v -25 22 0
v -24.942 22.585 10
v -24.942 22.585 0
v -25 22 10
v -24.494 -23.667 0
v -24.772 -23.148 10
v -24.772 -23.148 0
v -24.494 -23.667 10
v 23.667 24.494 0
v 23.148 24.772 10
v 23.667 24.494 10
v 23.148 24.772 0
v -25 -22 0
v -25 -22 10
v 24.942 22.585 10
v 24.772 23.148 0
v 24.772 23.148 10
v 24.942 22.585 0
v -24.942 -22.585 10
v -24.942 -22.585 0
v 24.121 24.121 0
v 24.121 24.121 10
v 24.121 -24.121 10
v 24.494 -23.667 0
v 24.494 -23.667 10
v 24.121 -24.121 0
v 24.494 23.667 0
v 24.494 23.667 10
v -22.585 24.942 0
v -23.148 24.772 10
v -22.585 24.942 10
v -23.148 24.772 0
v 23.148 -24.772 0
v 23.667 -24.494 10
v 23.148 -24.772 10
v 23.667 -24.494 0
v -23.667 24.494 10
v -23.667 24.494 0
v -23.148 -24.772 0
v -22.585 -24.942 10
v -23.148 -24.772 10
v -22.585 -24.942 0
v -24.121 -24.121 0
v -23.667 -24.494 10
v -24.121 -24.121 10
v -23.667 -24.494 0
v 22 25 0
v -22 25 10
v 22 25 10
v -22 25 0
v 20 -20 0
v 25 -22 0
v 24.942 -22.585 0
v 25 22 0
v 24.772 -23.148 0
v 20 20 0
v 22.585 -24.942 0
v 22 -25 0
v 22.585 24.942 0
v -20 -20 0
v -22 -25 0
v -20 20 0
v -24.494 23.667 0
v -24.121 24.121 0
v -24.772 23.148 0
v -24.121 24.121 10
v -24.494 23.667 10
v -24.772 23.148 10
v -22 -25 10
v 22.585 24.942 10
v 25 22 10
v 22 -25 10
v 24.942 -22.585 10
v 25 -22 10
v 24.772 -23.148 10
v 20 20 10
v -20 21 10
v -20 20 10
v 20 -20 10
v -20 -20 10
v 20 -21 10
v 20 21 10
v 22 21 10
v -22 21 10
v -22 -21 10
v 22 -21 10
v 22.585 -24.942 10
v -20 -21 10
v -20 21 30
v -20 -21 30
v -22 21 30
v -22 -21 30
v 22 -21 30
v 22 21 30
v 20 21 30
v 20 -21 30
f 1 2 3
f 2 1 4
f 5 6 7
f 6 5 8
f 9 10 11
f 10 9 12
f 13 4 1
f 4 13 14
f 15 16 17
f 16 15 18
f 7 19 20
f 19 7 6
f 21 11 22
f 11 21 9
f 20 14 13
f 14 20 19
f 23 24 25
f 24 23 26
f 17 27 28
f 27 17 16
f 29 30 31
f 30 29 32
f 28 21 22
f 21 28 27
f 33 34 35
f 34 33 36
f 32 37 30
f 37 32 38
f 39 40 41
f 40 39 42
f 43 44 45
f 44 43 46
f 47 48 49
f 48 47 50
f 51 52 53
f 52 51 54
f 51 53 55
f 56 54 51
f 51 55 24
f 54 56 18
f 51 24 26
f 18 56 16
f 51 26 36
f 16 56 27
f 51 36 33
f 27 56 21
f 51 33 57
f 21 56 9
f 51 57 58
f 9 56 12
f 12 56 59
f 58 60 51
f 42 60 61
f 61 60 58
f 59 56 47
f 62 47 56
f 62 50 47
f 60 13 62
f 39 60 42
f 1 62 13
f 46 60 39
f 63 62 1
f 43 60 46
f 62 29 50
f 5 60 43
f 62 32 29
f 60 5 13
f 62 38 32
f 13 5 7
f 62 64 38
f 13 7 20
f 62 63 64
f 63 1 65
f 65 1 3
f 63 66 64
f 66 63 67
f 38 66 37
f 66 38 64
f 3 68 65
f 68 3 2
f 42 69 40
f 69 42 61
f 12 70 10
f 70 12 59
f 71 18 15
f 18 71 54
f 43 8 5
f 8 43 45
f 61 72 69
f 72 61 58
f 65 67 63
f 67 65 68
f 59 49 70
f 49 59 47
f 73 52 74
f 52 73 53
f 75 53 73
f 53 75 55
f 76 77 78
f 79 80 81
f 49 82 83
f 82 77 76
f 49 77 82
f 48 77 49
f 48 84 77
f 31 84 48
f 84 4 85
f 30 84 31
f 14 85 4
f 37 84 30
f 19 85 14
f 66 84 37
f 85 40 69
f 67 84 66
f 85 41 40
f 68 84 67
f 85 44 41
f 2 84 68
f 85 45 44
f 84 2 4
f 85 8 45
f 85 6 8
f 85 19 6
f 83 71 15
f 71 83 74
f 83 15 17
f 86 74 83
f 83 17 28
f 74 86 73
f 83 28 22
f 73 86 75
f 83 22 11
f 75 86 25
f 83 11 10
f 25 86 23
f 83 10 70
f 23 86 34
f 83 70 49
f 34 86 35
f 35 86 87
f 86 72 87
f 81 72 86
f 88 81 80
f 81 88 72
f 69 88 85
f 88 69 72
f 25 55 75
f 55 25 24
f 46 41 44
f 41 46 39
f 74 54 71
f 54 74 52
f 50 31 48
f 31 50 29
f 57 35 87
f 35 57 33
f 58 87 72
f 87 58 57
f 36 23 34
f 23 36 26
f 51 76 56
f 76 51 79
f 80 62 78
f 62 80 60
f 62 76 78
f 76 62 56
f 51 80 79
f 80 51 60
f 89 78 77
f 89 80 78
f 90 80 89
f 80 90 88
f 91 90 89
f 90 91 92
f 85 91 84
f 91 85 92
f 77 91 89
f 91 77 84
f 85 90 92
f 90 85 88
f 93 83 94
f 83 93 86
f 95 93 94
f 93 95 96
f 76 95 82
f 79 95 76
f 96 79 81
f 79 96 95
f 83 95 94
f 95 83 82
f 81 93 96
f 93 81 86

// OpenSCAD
/*
* Filename: fan40mm_frame.scad
* Created by: Anhtien Nguyen
* Date: 27-Jun-2018
* Description: 40mm fan holder
*/
// outer frame width
o_width=50; 
// outer frame length
o_length=50;
// frame thickness, keep this for 40mm fan
thick = 10; 
// keep this for 40mm fan
fan_size = 40; 
 // reduce this to make it tighter
clearance = 0.25;
// M3 diameter
hole_size = 3; 
// hole distance from edge
hole_dist = 3; 
// bracket length, if zeroed then 4 holes are provided
bracket = 20;

printFrame($fn=32);

module printFrame() {
    difference()
    {
        // print the base plate
        drawBasePlate([o_width,o_length,thick], 3);

        // punch 4 holes at the corners if bracket not used
        if (bracket == 0) {
            translate([(-o_width/2)+hole_dist, (-o_length/2)+hole_dist, thick/2])
            cylinder(r=hole_size/2, h=thick+2,center=true); 
                translate([(o_width/2)-hole_dist, (o_length/2)-hole_dist, thick/2])
            cylinder(r=hole_size/2, h=thick+2,center=true); 

                translate([(-o_width/2)+hole_dist, (o_length/2)-hole_dist, thick/2])
            cylinder(r=hole_size/2, h=thick+2,center=true); 

                translate([(o_width/2)-hole_dist, (-o_length/2)+hole_dist, thick/2])
            cylinder(r=hole_size/2, h=thick+2,center=true); 
        }
        //  cut the 40mm square (with clearance) in the middle
        translate([0,0,thick/2])
        cube([fan_size,fan_size,thick+2], center=true);
    }
    // add brackets at 2 sides
    if (bracket >0)
    {
        translate([-fan_size/2-1,0,thick+bracket/2])
        cube([2,fan_size+2,bracket],center=true);
        translate([fan_size/2+1,0,thick+bracket/2])
        cube([2,fan_size+2,bracket],center=true);
    }
}

module drawBasePlate(dim, radius)
{
	wid = dim[0];
	len = dim[1];
	ht = dim[2];

	linear_extrude(height=ht)
	hull()
	{
		translate([(-wid/2)+radius, (-len/2)+radius, 0]) circle(r=radius);
		translate([(wid/2)-radius, (-len/2)+radius, 0]) circle(r=radius);
		translate([(-wid/2)+radius, (len/2)-radius, 0]) circle(r=radius);
		translate([(wid/2)-radius, (len/2)-radius, 0]) circle(r=radius);
	}
}
